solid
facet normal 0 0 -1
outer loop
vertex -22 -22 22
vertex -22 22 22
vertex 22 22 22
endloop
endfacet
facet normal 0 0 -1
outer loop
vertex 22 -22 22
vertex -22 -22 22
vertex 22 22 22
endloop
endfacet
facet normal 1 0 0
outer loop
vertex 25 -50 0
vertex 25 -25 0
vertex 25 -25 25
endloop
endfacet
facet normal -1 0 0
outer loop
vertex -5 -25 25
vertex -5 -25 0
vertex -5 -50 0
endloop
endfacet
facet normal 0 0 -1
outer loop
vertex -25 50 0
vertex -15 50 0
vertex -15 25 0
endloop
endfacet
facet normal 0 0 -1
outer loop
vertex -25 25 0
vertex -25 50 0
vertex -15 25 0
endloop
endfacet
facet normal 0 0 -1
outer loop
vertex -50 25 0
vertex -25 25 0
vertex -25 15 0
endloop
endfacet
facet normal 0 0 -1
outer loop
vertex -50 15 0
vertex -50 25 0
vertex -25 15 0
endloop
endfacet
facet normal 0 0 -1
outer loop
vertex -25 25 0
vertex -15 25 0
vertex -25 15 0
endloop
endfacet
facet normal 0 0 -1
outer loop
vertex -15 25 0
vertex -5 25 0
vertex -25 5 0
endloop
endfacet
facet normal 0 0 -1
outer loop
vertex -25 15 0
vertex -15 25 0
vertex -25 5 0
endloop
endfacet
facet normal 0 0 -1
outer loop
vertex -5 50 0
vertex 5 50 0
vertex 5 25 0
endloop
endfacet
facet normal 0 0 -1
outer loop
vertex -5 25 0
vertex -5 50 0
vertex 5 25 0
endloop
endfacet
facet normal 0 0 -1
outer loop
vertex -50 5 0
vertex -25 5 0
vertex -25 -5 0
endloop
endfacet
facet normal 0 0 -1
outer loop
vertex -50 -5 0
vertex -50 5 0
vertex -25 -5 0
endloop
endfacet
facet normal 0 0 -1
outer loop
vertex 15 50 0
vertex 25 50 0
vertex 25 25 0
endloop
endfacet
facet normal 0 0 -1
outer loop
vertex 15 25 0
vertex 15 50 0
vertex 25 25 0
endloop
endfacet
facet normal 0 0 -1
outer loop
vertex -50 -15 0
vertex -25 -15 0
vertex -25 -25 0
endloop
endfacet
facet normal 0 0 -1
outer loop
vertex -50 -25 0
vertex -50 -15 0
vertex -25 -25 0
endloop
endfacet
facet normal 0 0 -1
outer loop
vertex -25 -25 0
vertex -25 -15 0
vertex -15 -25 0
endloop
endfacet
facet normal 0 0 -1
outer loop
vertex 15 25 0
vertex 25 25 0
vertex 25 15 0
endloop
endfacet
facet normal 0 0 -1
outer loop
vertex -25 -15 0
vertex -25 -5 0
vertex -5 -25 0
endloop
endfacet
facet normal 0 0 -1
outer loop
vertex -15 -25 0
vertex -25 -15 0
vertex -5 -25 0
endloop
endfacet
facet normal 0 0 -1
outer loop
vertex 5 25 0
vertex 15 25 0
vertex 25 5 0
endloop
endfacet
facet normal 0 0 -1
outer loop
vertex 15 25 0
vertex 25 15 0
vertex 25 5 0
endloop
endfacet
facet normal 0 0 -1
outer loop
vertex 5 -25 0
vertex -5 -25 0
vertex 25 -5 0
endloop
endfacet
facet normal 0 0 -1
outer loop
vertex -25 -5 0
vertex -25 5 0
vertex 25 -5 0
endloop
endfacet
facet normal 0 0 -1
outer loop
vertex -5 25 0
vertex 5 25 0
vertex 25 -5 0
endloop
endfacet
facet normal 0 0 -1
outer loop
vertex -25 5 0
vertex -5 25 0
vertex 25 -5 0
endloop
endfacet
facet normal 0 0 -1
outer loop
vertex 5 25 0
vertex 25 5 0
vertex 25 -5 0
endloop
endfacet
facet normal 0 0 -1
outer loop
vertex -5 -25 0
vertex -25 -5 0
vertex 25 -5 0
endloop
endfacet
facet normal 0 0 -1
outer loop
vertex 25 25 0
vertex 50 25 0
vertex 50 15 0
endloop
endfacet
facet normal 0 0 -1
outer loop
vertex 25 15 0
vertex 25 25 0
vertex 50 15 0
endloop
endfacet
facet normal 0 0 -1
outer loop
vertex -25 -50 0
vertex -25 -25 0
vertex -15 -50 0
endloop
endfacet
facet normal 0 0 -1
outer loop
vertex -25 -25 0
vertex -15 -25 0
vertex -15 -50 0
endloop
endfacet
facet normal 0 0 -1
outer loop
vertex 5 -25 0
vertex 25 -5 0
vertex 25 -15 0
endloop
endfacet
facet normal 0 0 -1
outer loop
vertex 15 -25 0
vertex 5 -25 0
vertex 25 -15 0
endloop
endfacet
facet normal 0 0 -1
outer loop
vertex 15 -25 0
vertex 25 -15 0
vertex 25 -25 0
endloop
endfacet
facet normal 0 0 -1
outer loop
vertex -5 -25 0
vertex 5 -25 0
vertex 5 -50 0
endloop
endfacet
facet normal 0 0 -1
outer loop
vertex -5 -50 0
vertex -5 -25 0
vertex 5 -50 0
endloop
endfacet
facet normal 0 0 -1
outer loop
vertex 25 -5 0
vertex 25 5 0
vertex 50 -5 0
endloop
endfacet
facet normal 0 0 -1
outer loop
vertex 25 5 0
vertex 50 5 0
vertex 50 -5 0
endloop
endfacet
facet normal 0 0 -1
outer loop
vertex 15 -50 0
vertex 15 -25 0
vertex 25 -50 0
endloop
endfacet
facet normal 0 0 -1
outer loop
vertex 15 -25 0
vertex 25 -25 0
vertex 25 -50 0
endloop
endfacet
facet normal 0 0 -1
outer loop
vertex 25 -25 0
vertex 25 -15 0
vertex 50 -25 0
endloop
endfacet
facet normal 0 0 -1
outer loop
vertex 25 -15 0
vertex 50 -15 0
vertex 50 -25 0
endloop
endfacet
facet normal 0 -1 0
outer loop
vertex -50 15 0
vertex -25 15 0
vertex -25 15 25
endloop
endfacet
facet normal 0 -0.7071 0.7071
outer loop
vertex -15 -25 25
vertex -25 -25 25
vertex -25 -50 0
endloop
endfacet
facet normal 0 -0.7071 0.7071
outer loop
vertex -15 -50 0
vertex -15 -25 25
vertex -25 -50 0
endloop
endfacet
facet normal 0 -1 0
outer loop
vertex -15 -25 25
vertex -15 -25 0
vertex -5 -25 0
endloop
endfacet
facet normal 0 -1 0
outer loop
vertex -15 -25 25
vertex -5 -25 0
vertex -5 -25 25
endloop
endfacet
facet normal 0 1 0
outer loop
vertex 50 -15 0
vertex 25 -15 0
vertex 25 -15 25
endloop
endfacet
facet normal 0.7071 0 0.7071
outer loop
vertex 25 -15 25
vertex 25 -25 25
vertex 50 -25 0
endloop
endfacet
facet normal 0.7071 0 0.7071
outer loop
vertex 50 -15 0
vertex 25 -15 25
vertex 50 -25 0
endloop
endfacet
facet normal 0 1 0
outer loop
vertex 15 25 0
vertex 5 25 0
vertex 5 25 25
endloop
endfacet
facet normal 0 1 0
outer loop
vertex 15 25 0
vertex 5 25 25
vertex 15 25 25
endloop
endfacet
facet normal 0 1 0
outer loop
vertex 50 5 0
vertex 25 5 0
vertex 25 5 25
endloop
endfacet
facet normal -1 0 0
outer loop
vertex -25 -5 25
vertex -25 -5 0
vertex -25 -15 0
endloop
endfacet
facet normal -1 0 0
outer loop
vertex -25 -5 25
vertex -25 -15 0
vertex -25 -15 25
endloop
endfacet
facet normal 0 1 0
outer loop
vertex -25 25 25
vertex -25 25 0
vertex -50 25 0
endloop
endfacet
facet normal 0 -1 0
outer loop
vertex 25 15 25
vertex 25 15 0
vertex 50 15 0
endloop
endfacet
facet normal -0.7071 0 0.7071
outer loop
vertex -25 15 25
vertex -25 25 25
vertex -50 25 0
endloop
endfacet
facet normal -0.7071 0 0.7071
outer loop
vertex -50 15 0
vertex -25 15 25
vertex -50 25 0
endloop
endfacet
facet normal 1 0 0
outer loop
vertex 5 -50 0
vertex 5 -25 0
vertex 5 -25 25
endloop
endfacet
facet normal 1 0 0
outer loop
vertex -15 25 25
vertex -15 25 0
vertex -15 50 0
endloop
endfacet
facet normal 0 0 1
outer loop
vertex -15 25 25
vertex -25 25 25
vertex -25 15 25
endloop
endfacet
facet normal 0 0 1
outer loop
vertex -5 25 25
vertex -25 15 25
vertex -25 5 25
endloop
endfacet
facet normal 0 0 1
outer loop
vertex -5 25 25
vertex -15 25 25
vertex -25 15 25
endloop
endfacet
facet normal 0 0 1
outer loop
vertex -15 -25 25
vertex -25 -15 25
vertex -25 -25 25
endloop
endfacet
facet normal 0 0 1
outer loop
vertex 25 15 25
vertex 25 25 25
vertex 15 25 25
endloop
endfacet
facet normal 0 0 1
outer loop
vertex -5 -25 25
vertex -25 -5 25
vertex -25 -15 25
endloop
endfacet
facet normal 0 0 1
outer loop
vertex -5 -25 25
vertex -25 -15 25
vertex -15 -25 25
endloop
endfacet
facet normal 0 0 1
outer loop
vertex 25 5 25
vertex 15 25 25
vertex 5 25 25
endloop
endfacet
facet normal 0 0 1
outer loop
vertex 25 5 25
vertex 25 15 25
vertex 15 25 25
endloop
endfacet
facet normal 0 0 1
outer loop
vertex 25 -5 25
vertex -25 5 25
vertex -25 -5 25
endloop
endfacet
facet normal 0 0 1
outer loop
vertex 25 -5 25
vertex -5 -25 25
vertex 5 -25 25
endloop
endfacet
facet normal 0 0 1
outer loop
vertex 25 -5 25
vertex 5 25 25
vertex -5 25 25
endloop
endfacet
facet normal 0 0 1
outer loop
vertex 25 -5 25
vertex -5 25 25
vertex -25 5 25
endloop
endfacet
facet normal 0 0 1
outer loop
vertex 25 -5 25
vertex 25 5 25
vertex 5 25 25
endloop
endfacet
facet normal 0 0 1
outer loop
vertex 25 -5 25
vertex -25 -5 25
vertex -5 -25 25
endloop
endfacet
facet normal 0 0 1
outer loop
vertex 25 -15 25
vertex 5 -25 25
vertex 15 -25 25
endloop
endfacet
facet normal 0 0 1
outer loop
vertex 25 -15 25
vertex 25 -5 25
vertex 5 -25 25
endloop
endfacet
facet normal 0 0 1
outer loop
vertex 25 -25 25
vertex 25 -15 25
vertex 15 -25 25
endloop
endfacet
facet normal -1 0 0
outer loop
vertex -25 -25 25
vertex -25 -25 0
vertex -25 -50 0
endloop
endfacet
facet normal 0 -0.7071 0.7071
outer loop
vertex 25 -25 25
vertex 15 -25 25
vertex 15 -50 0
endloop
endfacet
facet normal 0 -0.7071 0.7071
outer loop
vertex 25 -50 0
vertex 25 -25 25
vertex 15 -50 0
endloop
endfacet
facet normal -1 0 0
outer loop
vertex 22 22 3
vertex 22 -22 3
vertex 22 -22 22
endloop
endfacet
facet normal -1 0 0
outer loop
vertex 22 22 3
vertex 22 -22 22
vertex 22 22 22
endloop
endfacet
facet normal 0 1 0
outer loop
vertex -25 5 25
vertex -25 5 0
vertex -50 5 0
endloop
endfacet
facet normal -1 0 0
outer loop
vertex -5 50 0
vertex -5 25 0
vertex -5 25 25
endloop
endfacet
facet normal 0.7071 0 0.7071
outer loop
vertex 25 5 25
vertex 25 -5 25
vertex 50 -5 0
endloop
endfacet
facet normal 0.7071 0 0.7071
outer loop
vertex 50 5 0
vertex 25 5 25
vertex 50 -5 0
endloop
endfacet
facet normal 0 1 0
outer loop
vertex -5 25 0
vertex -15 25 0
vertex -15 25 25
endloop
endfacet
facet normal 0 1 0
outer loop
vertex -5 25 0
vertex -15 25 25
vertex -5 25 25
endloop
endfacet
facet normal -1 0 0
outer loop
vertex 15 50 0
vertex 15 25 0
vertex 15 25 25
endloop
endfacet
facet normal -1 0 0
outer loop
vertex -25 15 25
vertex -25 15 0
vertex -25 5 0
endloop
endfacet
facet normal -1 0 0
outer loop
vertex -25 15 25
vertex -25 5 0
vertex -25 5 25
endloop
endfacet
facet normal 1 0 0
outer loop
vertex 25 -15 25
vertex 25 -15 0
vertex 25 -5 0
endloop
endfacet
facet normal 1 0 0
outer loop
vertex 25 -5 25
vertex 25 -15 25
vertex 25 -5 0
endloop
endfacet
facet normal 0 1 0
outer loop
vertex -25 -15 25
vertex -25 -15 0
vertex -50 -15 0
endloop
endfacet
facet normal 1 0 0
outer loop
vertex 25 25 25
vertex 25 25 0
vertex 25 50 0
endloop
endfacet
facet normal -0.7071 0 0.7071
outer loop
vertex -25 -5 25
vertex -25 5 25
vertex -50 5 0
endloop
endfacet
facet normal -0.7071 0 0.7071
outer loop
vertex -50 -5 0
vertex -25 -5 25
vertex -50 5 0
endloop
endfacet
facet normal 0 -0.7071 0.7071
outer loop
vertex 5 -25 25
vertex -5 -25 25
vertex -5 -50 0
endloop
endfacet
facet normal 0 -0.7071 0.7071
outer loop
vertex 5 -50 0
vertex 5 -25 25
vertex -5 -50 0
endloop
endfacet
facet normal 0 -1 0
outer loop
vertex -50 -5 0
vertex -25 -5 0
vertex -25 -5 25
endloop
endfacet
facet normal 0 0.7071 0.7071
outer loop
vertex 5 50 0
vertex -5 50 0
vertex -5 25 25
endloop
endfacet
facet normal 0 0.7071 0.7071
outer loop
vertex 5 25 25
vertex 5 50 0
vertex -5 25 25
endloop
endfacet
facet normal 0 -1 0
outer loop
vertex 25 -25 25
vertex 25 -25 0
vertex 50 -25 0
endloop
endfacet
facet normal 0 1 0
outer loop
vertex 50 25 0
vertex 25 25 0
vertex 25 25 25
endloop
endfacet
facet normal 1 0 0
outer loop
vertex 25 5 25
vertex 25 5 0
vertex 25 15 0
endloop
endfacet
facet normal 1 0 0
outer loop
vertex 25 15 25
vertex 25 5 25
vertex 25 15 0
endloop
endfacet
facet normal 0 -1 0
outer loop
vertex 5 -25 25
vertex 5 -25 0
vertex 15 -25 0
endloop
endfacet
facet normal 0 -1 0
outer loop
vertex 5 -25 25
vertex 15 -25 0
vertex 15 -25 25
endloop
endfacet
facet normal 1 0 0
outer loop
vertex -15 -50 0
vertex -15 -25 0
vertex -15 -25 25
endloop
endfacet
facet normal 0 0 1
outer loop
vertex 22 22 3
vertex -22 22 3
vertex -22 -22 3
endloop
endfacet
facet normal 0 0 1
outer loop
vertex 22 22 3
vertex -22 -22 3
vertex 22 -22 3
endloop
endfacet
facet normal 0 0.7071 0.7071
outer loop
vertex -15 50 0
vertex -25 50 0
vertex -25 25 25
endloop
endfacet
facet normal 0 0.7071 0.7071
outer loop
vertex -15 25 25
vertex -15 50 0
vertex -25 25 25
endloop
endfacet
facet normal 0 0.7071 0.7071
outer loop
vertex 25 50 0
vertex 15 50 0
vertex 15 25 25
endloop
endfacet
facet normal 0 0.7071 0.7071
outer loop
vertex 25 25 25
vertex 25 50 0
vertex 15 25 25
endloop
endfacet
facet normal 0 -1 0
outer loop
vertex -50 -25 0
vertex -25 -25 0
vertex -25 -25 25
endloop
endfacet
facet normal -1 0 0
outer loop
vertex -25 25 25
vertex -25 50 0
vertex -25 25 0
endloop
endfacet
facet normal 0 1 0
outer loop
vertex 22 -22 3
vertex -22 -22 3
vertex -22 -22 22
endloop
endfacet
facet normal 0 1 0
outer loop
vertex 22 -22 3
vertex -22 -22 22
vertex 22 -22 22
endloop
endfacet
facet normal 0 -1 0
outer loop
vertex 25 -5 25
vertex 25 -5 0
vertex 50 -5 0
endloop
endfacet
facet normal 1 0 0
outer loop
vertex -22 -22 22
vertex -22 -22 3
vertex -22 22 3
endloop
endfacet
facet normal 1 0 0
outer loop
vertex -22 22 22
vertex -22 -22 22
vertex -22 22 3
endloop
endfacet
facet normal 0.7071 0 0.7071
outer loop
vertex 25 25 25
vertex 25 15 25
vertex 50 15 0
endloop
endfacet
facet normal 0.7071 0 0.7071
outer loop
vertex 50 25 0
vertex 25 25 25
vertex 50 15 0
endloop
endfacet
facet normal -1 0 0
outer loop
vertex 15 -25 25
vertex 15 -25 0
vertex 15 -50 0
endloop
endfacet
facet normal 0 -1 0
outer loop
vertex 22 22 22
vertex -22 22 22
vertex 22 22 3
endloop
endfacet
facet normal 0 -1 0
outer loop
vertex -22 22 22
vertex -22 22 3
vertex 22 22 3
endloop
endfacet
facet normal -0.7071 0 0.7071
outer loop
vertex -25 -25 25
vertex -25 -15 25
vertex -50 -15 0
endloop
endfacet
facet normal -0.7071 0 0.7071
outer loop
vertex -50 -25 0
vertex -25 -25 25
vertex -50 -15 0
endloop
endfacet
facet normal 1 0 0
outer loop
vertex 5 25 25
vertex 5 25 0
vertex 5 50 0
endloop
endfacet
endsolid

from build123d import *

# Parameters (mm, degrees)
F0_W      = 50
F0_H      = 50
F1_DEPTH  = 25
F2_T      = -3
F3_W      = 10
F3_H      = 25
F4_DEPTH  = 25
F6_DEPTH  = 50
F7_W      = 10
F7_H      = 25
F8_DEPTH  = 25
F10_DEPTH = 50
F11_W     = 10
F11_H     = 25
F12_DEPTH = 25
F14_DEPTH = 50
F15_W     = 10
F15_H     = 25
F16_DEPTH = 25
F18_DEPTH = 50


with BuildPart() as f1:
    # F0 (on Top) → F1 (new body)
    with BuildSketch(Plane.XY):
        Rectangle(F0_W, F0_H)
    extrude(amount=F1_DEPTH)

    # F2 (hollow: no face is removed)
    offset(amount=F2_T, mode=Mode.SUBTRACT)

    # F3 (on face) → F4 (join)
    with BuildSketch(Plane.YZ.offset(25)):
        with Locations((-20, 12.5)):
            Rectangle(F3_W, F3_H)
        with Locations((0, 12.5)):
            Rectangle(F3_W, F3_H)
        with Locations((20, 12.5)):
            Rectangle(F3_W, F3_H)
    extrude(amount=F4_DEPTH)

    # F5 (on face) → F6 (cut)
    with BuildSketch(Plane.XZ.offset(25)):
        Polygon((50, 0), (50, 25), (25, 25), align=None)
    extrude(amount=-F6_DEPTH, mode=Mode.SUBTRACT)

    # F7 (on face) → F8 (join)
    with BuildSketch(Plane(origin=(0, 25, 0), x_dir=(-1, 0, 0), z_dir=(0, 1, 0))):
        with Locations((-20, 12.5)):
            Rectangle(F7_W, F7_H)
        with Locations((0, 12.5)):
            Rectangle(F7_W, F7_H)
        with Locations((20, 12.5)):
            Rectangle(F7_W, F7_H)
    extrude(amount=F8_DEPTH)

    # F9 (on face) → F10 (cut)
    with BuildSketch(Plane(origin=(-25, 0, 0), x_dir=(0, -1, 0), z_dir=(-1, 0, 0))):
        Polygon((-25, 25), (-50, 25), (-50, 0), align=None)
    extrude(amount=-F10_DEPTH, mode=Mode.SUBTRACT)

    # F11 (on face) → F12 (join)
    with BuildSketch(Plane.XZ.offset(25)):
        with Locations((-20, 12.5)):
            Rectangle(F11_W, F11_H)
        with Locations((0, 12.5)):
            Rectangle(F11_W, F11_H)
        with Locations((20, 12.5)):
            Rectangle(F11_W, F11_H)
    extrude(amount=F12_DEPTH)

    # F13 (on face) → F14 (cut)
    with BuildSketch(Plane(origin=(-25, 0, 0), x_dir=(0, -1, 0), z_dir=(-1, 0, 0))):
        Polygon((50, 0), (50, 25), (25, 25), align=None)
    extrude(amount=-F14_DEPTH, mode=Mode.SUBTRACT)

    # F15 (on face) → F16 (join)
    with BuildSketch(Plane(origin=(-25, 0, 0), x_dir=(0, -1, 0), z_dir=(-1, 0, 0))):
        with Locations((-20, 12.5)):
            Rectangle(F15_W, F15_H)
        with Locations((0, 12.5)):
            Rectangle(F15_W, F15_H)
        with Locations((20, 12.5)):
            Rectangle(F15_W, F15_H)
    extrude(amount=F16_DEPTH)

    # F17 (on face) → F18 (cut)
    with BuildSketch(Plane(origin=(0, 25, 0), x_dir=(-1, 0, 0), z_dir=(0, 1, 0))):
        Polygon((50, 25), (25, 25), (50, 0), align=None)
    extrude(amount=-F18_DEPTH, mode=Mode.SUBTRACT)


solid = f1.part
